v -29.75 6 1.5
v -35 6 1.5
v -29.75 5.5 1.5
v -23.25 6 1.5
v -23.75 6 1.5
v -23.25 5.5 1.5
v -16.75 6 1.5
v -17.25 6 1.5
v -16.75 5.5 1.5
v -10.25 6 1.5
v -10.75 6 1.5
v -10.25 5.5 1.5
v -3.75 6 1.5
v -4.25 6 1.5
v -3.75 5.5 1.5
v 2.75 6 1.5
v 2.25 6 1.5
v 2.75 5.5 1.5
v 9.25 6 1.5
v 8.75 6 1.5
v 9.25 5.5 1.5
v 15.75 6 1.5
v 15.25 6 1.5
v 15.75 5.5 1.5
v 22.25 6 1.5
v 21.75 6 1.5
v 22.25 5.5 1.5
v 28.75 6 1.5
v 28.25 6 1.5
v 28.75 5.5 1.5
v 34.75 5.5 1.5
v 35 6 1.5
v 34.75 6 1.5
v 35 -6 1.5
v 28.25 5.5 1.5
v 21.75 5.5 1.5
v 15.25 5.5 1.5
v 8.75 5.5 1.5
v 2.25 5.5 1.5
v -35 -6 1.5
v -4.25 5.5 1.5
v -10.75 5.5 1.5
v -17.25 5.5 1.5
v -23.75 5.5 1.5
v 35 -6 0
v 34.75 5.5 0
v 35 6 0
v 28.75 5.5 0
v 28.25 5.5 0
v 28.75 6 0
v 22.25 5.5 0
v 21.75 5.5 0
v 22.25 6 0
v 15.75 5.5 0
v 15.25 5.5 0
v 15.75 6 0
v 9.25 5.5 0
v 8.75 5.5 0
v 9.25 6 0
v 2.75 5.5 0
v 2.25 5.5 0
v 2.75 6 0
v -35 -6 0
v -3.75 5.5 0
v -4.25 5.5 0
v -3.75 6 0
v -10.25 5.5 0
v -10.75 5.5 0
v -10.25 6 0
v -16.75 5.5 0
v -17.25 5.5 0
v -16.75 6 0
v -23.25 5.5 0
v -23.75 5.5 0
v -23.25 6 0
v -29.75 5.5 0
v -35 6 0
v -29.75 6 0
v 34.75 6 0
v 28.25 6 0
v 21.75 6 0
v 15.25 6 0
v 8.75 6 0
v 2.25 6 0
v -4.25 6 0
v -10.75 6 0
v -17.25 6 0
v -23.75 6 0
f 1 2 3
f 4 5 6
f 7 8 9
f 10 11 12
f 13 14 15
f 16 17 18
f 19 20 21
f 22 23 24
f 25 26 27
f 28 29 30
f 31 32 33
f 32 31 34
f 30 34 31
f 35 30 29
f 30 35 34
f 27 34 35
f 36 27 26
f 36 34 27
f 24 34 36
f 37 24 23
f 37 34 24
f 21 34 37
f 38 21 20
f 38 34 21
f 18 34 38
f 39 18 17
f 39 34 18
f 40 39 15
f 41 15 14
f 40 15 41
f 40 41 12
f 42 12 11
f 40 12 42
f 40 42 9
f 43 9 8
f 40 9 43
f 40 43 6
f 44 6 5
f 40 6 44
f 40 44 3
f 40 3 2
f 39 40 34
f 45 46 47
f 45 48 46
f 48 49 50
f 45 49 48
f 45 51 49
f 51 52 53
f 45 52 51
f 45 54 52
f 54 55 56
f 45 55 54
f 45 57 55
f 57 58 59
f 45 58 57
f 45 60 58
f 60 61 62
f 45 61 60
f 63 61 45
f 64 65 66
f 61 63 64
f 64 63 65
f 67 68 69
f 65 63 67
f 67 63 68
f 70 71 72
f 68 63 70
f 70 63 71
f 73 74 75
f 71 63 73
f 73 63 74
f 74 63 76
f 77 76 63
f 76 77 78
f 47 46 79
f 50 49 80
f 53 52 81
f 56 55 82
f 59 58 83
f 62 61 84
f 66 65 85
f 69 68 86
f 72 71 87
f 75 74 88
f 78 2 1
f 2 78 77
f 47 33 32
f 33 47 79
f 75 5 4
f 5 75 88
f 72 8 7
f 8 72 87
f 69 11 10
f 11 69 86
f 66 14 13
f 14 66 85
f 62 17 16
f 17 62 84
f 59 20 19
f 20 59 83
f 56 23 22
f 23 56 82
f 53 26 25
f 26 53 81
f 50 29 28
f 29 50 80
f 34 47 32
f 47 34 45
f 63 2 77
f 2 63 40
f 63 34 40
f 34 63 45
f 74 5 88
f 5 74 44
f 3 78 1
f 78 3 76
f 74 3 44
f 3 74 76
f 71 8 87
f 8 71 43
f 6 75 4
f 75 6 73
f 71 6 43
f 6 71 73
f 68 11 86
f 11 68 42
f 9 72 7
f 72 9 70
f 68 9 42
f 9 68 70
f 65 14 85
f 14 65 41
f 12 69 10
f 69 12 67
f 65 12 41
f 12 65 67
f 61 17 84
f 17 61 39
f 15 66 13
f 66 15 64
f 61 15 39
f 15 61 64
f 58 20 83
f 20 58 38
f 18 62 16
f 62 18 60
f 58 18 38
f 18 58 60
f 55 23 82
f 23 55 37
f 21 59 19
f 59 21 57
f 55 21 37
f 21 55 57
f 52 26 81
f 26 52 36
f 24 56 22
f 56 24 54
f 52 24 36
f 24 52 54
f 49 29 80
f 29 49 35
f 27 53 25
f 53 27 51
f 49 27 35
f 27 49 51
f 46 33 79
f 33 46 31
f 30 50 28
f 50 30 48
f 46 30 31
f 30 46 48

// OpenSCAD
// 10-well comb for casting agarose gels
// Print orientation: flat on bed, teeth pointing down (-Y)

// ---------- Parameters ----------
plate_t      = 1.5;   // plate thickness (Z)
spine_len    = 70;    // spine length (X)
spine_w      = 12;    // spine width (Y)
tooth_w      = 5.0;   // tooth width (X)
tooth_len    = 12;    // tooth length (Y)
tooth_count  = 10;    // number of teeth
gap          = 1.5;   // gap between teeth (X)
eps          = 0.5;   // cutter overshoot past faces

$fn = 64;

// ---------- Derived ----------
pitch   = tooth_w + gap;          // centre-to-centre spacing of teeth
x_start = -(tooth_count - 1) * pitch / 2;  // first tooth centre (row centred)

// ---------- Model ----------
difference() {
    // Plate: spine + teeth, built upward from z = 0
    union() {
        // Spine (back bar)
        translate([-spine_len / 2, -spine_w / 2, 0])
            cube([spine_len, spine_w, plate_t]);

        // Teeth hanging in -Y from the spine's long edge
        for (i = [0 : tooth_count - 1])
            translate([x_start + i * pitch,
                       spine_w / 2,
                       0])
                cube([tooth_w, tooth_len, plate_t]);
    }

    // Cut out the wells (through the full thickness)
    for (i = [0 : tooth_count - 1])
        translate([x_start + i * pitch - eps,
                   spine_w / 2 - eps,
                   -eps])
            cube([tooth_w + 2 * eps,
                  tooth_len + 2 * eps,
                  plate_t + 2 * eps]);
}
